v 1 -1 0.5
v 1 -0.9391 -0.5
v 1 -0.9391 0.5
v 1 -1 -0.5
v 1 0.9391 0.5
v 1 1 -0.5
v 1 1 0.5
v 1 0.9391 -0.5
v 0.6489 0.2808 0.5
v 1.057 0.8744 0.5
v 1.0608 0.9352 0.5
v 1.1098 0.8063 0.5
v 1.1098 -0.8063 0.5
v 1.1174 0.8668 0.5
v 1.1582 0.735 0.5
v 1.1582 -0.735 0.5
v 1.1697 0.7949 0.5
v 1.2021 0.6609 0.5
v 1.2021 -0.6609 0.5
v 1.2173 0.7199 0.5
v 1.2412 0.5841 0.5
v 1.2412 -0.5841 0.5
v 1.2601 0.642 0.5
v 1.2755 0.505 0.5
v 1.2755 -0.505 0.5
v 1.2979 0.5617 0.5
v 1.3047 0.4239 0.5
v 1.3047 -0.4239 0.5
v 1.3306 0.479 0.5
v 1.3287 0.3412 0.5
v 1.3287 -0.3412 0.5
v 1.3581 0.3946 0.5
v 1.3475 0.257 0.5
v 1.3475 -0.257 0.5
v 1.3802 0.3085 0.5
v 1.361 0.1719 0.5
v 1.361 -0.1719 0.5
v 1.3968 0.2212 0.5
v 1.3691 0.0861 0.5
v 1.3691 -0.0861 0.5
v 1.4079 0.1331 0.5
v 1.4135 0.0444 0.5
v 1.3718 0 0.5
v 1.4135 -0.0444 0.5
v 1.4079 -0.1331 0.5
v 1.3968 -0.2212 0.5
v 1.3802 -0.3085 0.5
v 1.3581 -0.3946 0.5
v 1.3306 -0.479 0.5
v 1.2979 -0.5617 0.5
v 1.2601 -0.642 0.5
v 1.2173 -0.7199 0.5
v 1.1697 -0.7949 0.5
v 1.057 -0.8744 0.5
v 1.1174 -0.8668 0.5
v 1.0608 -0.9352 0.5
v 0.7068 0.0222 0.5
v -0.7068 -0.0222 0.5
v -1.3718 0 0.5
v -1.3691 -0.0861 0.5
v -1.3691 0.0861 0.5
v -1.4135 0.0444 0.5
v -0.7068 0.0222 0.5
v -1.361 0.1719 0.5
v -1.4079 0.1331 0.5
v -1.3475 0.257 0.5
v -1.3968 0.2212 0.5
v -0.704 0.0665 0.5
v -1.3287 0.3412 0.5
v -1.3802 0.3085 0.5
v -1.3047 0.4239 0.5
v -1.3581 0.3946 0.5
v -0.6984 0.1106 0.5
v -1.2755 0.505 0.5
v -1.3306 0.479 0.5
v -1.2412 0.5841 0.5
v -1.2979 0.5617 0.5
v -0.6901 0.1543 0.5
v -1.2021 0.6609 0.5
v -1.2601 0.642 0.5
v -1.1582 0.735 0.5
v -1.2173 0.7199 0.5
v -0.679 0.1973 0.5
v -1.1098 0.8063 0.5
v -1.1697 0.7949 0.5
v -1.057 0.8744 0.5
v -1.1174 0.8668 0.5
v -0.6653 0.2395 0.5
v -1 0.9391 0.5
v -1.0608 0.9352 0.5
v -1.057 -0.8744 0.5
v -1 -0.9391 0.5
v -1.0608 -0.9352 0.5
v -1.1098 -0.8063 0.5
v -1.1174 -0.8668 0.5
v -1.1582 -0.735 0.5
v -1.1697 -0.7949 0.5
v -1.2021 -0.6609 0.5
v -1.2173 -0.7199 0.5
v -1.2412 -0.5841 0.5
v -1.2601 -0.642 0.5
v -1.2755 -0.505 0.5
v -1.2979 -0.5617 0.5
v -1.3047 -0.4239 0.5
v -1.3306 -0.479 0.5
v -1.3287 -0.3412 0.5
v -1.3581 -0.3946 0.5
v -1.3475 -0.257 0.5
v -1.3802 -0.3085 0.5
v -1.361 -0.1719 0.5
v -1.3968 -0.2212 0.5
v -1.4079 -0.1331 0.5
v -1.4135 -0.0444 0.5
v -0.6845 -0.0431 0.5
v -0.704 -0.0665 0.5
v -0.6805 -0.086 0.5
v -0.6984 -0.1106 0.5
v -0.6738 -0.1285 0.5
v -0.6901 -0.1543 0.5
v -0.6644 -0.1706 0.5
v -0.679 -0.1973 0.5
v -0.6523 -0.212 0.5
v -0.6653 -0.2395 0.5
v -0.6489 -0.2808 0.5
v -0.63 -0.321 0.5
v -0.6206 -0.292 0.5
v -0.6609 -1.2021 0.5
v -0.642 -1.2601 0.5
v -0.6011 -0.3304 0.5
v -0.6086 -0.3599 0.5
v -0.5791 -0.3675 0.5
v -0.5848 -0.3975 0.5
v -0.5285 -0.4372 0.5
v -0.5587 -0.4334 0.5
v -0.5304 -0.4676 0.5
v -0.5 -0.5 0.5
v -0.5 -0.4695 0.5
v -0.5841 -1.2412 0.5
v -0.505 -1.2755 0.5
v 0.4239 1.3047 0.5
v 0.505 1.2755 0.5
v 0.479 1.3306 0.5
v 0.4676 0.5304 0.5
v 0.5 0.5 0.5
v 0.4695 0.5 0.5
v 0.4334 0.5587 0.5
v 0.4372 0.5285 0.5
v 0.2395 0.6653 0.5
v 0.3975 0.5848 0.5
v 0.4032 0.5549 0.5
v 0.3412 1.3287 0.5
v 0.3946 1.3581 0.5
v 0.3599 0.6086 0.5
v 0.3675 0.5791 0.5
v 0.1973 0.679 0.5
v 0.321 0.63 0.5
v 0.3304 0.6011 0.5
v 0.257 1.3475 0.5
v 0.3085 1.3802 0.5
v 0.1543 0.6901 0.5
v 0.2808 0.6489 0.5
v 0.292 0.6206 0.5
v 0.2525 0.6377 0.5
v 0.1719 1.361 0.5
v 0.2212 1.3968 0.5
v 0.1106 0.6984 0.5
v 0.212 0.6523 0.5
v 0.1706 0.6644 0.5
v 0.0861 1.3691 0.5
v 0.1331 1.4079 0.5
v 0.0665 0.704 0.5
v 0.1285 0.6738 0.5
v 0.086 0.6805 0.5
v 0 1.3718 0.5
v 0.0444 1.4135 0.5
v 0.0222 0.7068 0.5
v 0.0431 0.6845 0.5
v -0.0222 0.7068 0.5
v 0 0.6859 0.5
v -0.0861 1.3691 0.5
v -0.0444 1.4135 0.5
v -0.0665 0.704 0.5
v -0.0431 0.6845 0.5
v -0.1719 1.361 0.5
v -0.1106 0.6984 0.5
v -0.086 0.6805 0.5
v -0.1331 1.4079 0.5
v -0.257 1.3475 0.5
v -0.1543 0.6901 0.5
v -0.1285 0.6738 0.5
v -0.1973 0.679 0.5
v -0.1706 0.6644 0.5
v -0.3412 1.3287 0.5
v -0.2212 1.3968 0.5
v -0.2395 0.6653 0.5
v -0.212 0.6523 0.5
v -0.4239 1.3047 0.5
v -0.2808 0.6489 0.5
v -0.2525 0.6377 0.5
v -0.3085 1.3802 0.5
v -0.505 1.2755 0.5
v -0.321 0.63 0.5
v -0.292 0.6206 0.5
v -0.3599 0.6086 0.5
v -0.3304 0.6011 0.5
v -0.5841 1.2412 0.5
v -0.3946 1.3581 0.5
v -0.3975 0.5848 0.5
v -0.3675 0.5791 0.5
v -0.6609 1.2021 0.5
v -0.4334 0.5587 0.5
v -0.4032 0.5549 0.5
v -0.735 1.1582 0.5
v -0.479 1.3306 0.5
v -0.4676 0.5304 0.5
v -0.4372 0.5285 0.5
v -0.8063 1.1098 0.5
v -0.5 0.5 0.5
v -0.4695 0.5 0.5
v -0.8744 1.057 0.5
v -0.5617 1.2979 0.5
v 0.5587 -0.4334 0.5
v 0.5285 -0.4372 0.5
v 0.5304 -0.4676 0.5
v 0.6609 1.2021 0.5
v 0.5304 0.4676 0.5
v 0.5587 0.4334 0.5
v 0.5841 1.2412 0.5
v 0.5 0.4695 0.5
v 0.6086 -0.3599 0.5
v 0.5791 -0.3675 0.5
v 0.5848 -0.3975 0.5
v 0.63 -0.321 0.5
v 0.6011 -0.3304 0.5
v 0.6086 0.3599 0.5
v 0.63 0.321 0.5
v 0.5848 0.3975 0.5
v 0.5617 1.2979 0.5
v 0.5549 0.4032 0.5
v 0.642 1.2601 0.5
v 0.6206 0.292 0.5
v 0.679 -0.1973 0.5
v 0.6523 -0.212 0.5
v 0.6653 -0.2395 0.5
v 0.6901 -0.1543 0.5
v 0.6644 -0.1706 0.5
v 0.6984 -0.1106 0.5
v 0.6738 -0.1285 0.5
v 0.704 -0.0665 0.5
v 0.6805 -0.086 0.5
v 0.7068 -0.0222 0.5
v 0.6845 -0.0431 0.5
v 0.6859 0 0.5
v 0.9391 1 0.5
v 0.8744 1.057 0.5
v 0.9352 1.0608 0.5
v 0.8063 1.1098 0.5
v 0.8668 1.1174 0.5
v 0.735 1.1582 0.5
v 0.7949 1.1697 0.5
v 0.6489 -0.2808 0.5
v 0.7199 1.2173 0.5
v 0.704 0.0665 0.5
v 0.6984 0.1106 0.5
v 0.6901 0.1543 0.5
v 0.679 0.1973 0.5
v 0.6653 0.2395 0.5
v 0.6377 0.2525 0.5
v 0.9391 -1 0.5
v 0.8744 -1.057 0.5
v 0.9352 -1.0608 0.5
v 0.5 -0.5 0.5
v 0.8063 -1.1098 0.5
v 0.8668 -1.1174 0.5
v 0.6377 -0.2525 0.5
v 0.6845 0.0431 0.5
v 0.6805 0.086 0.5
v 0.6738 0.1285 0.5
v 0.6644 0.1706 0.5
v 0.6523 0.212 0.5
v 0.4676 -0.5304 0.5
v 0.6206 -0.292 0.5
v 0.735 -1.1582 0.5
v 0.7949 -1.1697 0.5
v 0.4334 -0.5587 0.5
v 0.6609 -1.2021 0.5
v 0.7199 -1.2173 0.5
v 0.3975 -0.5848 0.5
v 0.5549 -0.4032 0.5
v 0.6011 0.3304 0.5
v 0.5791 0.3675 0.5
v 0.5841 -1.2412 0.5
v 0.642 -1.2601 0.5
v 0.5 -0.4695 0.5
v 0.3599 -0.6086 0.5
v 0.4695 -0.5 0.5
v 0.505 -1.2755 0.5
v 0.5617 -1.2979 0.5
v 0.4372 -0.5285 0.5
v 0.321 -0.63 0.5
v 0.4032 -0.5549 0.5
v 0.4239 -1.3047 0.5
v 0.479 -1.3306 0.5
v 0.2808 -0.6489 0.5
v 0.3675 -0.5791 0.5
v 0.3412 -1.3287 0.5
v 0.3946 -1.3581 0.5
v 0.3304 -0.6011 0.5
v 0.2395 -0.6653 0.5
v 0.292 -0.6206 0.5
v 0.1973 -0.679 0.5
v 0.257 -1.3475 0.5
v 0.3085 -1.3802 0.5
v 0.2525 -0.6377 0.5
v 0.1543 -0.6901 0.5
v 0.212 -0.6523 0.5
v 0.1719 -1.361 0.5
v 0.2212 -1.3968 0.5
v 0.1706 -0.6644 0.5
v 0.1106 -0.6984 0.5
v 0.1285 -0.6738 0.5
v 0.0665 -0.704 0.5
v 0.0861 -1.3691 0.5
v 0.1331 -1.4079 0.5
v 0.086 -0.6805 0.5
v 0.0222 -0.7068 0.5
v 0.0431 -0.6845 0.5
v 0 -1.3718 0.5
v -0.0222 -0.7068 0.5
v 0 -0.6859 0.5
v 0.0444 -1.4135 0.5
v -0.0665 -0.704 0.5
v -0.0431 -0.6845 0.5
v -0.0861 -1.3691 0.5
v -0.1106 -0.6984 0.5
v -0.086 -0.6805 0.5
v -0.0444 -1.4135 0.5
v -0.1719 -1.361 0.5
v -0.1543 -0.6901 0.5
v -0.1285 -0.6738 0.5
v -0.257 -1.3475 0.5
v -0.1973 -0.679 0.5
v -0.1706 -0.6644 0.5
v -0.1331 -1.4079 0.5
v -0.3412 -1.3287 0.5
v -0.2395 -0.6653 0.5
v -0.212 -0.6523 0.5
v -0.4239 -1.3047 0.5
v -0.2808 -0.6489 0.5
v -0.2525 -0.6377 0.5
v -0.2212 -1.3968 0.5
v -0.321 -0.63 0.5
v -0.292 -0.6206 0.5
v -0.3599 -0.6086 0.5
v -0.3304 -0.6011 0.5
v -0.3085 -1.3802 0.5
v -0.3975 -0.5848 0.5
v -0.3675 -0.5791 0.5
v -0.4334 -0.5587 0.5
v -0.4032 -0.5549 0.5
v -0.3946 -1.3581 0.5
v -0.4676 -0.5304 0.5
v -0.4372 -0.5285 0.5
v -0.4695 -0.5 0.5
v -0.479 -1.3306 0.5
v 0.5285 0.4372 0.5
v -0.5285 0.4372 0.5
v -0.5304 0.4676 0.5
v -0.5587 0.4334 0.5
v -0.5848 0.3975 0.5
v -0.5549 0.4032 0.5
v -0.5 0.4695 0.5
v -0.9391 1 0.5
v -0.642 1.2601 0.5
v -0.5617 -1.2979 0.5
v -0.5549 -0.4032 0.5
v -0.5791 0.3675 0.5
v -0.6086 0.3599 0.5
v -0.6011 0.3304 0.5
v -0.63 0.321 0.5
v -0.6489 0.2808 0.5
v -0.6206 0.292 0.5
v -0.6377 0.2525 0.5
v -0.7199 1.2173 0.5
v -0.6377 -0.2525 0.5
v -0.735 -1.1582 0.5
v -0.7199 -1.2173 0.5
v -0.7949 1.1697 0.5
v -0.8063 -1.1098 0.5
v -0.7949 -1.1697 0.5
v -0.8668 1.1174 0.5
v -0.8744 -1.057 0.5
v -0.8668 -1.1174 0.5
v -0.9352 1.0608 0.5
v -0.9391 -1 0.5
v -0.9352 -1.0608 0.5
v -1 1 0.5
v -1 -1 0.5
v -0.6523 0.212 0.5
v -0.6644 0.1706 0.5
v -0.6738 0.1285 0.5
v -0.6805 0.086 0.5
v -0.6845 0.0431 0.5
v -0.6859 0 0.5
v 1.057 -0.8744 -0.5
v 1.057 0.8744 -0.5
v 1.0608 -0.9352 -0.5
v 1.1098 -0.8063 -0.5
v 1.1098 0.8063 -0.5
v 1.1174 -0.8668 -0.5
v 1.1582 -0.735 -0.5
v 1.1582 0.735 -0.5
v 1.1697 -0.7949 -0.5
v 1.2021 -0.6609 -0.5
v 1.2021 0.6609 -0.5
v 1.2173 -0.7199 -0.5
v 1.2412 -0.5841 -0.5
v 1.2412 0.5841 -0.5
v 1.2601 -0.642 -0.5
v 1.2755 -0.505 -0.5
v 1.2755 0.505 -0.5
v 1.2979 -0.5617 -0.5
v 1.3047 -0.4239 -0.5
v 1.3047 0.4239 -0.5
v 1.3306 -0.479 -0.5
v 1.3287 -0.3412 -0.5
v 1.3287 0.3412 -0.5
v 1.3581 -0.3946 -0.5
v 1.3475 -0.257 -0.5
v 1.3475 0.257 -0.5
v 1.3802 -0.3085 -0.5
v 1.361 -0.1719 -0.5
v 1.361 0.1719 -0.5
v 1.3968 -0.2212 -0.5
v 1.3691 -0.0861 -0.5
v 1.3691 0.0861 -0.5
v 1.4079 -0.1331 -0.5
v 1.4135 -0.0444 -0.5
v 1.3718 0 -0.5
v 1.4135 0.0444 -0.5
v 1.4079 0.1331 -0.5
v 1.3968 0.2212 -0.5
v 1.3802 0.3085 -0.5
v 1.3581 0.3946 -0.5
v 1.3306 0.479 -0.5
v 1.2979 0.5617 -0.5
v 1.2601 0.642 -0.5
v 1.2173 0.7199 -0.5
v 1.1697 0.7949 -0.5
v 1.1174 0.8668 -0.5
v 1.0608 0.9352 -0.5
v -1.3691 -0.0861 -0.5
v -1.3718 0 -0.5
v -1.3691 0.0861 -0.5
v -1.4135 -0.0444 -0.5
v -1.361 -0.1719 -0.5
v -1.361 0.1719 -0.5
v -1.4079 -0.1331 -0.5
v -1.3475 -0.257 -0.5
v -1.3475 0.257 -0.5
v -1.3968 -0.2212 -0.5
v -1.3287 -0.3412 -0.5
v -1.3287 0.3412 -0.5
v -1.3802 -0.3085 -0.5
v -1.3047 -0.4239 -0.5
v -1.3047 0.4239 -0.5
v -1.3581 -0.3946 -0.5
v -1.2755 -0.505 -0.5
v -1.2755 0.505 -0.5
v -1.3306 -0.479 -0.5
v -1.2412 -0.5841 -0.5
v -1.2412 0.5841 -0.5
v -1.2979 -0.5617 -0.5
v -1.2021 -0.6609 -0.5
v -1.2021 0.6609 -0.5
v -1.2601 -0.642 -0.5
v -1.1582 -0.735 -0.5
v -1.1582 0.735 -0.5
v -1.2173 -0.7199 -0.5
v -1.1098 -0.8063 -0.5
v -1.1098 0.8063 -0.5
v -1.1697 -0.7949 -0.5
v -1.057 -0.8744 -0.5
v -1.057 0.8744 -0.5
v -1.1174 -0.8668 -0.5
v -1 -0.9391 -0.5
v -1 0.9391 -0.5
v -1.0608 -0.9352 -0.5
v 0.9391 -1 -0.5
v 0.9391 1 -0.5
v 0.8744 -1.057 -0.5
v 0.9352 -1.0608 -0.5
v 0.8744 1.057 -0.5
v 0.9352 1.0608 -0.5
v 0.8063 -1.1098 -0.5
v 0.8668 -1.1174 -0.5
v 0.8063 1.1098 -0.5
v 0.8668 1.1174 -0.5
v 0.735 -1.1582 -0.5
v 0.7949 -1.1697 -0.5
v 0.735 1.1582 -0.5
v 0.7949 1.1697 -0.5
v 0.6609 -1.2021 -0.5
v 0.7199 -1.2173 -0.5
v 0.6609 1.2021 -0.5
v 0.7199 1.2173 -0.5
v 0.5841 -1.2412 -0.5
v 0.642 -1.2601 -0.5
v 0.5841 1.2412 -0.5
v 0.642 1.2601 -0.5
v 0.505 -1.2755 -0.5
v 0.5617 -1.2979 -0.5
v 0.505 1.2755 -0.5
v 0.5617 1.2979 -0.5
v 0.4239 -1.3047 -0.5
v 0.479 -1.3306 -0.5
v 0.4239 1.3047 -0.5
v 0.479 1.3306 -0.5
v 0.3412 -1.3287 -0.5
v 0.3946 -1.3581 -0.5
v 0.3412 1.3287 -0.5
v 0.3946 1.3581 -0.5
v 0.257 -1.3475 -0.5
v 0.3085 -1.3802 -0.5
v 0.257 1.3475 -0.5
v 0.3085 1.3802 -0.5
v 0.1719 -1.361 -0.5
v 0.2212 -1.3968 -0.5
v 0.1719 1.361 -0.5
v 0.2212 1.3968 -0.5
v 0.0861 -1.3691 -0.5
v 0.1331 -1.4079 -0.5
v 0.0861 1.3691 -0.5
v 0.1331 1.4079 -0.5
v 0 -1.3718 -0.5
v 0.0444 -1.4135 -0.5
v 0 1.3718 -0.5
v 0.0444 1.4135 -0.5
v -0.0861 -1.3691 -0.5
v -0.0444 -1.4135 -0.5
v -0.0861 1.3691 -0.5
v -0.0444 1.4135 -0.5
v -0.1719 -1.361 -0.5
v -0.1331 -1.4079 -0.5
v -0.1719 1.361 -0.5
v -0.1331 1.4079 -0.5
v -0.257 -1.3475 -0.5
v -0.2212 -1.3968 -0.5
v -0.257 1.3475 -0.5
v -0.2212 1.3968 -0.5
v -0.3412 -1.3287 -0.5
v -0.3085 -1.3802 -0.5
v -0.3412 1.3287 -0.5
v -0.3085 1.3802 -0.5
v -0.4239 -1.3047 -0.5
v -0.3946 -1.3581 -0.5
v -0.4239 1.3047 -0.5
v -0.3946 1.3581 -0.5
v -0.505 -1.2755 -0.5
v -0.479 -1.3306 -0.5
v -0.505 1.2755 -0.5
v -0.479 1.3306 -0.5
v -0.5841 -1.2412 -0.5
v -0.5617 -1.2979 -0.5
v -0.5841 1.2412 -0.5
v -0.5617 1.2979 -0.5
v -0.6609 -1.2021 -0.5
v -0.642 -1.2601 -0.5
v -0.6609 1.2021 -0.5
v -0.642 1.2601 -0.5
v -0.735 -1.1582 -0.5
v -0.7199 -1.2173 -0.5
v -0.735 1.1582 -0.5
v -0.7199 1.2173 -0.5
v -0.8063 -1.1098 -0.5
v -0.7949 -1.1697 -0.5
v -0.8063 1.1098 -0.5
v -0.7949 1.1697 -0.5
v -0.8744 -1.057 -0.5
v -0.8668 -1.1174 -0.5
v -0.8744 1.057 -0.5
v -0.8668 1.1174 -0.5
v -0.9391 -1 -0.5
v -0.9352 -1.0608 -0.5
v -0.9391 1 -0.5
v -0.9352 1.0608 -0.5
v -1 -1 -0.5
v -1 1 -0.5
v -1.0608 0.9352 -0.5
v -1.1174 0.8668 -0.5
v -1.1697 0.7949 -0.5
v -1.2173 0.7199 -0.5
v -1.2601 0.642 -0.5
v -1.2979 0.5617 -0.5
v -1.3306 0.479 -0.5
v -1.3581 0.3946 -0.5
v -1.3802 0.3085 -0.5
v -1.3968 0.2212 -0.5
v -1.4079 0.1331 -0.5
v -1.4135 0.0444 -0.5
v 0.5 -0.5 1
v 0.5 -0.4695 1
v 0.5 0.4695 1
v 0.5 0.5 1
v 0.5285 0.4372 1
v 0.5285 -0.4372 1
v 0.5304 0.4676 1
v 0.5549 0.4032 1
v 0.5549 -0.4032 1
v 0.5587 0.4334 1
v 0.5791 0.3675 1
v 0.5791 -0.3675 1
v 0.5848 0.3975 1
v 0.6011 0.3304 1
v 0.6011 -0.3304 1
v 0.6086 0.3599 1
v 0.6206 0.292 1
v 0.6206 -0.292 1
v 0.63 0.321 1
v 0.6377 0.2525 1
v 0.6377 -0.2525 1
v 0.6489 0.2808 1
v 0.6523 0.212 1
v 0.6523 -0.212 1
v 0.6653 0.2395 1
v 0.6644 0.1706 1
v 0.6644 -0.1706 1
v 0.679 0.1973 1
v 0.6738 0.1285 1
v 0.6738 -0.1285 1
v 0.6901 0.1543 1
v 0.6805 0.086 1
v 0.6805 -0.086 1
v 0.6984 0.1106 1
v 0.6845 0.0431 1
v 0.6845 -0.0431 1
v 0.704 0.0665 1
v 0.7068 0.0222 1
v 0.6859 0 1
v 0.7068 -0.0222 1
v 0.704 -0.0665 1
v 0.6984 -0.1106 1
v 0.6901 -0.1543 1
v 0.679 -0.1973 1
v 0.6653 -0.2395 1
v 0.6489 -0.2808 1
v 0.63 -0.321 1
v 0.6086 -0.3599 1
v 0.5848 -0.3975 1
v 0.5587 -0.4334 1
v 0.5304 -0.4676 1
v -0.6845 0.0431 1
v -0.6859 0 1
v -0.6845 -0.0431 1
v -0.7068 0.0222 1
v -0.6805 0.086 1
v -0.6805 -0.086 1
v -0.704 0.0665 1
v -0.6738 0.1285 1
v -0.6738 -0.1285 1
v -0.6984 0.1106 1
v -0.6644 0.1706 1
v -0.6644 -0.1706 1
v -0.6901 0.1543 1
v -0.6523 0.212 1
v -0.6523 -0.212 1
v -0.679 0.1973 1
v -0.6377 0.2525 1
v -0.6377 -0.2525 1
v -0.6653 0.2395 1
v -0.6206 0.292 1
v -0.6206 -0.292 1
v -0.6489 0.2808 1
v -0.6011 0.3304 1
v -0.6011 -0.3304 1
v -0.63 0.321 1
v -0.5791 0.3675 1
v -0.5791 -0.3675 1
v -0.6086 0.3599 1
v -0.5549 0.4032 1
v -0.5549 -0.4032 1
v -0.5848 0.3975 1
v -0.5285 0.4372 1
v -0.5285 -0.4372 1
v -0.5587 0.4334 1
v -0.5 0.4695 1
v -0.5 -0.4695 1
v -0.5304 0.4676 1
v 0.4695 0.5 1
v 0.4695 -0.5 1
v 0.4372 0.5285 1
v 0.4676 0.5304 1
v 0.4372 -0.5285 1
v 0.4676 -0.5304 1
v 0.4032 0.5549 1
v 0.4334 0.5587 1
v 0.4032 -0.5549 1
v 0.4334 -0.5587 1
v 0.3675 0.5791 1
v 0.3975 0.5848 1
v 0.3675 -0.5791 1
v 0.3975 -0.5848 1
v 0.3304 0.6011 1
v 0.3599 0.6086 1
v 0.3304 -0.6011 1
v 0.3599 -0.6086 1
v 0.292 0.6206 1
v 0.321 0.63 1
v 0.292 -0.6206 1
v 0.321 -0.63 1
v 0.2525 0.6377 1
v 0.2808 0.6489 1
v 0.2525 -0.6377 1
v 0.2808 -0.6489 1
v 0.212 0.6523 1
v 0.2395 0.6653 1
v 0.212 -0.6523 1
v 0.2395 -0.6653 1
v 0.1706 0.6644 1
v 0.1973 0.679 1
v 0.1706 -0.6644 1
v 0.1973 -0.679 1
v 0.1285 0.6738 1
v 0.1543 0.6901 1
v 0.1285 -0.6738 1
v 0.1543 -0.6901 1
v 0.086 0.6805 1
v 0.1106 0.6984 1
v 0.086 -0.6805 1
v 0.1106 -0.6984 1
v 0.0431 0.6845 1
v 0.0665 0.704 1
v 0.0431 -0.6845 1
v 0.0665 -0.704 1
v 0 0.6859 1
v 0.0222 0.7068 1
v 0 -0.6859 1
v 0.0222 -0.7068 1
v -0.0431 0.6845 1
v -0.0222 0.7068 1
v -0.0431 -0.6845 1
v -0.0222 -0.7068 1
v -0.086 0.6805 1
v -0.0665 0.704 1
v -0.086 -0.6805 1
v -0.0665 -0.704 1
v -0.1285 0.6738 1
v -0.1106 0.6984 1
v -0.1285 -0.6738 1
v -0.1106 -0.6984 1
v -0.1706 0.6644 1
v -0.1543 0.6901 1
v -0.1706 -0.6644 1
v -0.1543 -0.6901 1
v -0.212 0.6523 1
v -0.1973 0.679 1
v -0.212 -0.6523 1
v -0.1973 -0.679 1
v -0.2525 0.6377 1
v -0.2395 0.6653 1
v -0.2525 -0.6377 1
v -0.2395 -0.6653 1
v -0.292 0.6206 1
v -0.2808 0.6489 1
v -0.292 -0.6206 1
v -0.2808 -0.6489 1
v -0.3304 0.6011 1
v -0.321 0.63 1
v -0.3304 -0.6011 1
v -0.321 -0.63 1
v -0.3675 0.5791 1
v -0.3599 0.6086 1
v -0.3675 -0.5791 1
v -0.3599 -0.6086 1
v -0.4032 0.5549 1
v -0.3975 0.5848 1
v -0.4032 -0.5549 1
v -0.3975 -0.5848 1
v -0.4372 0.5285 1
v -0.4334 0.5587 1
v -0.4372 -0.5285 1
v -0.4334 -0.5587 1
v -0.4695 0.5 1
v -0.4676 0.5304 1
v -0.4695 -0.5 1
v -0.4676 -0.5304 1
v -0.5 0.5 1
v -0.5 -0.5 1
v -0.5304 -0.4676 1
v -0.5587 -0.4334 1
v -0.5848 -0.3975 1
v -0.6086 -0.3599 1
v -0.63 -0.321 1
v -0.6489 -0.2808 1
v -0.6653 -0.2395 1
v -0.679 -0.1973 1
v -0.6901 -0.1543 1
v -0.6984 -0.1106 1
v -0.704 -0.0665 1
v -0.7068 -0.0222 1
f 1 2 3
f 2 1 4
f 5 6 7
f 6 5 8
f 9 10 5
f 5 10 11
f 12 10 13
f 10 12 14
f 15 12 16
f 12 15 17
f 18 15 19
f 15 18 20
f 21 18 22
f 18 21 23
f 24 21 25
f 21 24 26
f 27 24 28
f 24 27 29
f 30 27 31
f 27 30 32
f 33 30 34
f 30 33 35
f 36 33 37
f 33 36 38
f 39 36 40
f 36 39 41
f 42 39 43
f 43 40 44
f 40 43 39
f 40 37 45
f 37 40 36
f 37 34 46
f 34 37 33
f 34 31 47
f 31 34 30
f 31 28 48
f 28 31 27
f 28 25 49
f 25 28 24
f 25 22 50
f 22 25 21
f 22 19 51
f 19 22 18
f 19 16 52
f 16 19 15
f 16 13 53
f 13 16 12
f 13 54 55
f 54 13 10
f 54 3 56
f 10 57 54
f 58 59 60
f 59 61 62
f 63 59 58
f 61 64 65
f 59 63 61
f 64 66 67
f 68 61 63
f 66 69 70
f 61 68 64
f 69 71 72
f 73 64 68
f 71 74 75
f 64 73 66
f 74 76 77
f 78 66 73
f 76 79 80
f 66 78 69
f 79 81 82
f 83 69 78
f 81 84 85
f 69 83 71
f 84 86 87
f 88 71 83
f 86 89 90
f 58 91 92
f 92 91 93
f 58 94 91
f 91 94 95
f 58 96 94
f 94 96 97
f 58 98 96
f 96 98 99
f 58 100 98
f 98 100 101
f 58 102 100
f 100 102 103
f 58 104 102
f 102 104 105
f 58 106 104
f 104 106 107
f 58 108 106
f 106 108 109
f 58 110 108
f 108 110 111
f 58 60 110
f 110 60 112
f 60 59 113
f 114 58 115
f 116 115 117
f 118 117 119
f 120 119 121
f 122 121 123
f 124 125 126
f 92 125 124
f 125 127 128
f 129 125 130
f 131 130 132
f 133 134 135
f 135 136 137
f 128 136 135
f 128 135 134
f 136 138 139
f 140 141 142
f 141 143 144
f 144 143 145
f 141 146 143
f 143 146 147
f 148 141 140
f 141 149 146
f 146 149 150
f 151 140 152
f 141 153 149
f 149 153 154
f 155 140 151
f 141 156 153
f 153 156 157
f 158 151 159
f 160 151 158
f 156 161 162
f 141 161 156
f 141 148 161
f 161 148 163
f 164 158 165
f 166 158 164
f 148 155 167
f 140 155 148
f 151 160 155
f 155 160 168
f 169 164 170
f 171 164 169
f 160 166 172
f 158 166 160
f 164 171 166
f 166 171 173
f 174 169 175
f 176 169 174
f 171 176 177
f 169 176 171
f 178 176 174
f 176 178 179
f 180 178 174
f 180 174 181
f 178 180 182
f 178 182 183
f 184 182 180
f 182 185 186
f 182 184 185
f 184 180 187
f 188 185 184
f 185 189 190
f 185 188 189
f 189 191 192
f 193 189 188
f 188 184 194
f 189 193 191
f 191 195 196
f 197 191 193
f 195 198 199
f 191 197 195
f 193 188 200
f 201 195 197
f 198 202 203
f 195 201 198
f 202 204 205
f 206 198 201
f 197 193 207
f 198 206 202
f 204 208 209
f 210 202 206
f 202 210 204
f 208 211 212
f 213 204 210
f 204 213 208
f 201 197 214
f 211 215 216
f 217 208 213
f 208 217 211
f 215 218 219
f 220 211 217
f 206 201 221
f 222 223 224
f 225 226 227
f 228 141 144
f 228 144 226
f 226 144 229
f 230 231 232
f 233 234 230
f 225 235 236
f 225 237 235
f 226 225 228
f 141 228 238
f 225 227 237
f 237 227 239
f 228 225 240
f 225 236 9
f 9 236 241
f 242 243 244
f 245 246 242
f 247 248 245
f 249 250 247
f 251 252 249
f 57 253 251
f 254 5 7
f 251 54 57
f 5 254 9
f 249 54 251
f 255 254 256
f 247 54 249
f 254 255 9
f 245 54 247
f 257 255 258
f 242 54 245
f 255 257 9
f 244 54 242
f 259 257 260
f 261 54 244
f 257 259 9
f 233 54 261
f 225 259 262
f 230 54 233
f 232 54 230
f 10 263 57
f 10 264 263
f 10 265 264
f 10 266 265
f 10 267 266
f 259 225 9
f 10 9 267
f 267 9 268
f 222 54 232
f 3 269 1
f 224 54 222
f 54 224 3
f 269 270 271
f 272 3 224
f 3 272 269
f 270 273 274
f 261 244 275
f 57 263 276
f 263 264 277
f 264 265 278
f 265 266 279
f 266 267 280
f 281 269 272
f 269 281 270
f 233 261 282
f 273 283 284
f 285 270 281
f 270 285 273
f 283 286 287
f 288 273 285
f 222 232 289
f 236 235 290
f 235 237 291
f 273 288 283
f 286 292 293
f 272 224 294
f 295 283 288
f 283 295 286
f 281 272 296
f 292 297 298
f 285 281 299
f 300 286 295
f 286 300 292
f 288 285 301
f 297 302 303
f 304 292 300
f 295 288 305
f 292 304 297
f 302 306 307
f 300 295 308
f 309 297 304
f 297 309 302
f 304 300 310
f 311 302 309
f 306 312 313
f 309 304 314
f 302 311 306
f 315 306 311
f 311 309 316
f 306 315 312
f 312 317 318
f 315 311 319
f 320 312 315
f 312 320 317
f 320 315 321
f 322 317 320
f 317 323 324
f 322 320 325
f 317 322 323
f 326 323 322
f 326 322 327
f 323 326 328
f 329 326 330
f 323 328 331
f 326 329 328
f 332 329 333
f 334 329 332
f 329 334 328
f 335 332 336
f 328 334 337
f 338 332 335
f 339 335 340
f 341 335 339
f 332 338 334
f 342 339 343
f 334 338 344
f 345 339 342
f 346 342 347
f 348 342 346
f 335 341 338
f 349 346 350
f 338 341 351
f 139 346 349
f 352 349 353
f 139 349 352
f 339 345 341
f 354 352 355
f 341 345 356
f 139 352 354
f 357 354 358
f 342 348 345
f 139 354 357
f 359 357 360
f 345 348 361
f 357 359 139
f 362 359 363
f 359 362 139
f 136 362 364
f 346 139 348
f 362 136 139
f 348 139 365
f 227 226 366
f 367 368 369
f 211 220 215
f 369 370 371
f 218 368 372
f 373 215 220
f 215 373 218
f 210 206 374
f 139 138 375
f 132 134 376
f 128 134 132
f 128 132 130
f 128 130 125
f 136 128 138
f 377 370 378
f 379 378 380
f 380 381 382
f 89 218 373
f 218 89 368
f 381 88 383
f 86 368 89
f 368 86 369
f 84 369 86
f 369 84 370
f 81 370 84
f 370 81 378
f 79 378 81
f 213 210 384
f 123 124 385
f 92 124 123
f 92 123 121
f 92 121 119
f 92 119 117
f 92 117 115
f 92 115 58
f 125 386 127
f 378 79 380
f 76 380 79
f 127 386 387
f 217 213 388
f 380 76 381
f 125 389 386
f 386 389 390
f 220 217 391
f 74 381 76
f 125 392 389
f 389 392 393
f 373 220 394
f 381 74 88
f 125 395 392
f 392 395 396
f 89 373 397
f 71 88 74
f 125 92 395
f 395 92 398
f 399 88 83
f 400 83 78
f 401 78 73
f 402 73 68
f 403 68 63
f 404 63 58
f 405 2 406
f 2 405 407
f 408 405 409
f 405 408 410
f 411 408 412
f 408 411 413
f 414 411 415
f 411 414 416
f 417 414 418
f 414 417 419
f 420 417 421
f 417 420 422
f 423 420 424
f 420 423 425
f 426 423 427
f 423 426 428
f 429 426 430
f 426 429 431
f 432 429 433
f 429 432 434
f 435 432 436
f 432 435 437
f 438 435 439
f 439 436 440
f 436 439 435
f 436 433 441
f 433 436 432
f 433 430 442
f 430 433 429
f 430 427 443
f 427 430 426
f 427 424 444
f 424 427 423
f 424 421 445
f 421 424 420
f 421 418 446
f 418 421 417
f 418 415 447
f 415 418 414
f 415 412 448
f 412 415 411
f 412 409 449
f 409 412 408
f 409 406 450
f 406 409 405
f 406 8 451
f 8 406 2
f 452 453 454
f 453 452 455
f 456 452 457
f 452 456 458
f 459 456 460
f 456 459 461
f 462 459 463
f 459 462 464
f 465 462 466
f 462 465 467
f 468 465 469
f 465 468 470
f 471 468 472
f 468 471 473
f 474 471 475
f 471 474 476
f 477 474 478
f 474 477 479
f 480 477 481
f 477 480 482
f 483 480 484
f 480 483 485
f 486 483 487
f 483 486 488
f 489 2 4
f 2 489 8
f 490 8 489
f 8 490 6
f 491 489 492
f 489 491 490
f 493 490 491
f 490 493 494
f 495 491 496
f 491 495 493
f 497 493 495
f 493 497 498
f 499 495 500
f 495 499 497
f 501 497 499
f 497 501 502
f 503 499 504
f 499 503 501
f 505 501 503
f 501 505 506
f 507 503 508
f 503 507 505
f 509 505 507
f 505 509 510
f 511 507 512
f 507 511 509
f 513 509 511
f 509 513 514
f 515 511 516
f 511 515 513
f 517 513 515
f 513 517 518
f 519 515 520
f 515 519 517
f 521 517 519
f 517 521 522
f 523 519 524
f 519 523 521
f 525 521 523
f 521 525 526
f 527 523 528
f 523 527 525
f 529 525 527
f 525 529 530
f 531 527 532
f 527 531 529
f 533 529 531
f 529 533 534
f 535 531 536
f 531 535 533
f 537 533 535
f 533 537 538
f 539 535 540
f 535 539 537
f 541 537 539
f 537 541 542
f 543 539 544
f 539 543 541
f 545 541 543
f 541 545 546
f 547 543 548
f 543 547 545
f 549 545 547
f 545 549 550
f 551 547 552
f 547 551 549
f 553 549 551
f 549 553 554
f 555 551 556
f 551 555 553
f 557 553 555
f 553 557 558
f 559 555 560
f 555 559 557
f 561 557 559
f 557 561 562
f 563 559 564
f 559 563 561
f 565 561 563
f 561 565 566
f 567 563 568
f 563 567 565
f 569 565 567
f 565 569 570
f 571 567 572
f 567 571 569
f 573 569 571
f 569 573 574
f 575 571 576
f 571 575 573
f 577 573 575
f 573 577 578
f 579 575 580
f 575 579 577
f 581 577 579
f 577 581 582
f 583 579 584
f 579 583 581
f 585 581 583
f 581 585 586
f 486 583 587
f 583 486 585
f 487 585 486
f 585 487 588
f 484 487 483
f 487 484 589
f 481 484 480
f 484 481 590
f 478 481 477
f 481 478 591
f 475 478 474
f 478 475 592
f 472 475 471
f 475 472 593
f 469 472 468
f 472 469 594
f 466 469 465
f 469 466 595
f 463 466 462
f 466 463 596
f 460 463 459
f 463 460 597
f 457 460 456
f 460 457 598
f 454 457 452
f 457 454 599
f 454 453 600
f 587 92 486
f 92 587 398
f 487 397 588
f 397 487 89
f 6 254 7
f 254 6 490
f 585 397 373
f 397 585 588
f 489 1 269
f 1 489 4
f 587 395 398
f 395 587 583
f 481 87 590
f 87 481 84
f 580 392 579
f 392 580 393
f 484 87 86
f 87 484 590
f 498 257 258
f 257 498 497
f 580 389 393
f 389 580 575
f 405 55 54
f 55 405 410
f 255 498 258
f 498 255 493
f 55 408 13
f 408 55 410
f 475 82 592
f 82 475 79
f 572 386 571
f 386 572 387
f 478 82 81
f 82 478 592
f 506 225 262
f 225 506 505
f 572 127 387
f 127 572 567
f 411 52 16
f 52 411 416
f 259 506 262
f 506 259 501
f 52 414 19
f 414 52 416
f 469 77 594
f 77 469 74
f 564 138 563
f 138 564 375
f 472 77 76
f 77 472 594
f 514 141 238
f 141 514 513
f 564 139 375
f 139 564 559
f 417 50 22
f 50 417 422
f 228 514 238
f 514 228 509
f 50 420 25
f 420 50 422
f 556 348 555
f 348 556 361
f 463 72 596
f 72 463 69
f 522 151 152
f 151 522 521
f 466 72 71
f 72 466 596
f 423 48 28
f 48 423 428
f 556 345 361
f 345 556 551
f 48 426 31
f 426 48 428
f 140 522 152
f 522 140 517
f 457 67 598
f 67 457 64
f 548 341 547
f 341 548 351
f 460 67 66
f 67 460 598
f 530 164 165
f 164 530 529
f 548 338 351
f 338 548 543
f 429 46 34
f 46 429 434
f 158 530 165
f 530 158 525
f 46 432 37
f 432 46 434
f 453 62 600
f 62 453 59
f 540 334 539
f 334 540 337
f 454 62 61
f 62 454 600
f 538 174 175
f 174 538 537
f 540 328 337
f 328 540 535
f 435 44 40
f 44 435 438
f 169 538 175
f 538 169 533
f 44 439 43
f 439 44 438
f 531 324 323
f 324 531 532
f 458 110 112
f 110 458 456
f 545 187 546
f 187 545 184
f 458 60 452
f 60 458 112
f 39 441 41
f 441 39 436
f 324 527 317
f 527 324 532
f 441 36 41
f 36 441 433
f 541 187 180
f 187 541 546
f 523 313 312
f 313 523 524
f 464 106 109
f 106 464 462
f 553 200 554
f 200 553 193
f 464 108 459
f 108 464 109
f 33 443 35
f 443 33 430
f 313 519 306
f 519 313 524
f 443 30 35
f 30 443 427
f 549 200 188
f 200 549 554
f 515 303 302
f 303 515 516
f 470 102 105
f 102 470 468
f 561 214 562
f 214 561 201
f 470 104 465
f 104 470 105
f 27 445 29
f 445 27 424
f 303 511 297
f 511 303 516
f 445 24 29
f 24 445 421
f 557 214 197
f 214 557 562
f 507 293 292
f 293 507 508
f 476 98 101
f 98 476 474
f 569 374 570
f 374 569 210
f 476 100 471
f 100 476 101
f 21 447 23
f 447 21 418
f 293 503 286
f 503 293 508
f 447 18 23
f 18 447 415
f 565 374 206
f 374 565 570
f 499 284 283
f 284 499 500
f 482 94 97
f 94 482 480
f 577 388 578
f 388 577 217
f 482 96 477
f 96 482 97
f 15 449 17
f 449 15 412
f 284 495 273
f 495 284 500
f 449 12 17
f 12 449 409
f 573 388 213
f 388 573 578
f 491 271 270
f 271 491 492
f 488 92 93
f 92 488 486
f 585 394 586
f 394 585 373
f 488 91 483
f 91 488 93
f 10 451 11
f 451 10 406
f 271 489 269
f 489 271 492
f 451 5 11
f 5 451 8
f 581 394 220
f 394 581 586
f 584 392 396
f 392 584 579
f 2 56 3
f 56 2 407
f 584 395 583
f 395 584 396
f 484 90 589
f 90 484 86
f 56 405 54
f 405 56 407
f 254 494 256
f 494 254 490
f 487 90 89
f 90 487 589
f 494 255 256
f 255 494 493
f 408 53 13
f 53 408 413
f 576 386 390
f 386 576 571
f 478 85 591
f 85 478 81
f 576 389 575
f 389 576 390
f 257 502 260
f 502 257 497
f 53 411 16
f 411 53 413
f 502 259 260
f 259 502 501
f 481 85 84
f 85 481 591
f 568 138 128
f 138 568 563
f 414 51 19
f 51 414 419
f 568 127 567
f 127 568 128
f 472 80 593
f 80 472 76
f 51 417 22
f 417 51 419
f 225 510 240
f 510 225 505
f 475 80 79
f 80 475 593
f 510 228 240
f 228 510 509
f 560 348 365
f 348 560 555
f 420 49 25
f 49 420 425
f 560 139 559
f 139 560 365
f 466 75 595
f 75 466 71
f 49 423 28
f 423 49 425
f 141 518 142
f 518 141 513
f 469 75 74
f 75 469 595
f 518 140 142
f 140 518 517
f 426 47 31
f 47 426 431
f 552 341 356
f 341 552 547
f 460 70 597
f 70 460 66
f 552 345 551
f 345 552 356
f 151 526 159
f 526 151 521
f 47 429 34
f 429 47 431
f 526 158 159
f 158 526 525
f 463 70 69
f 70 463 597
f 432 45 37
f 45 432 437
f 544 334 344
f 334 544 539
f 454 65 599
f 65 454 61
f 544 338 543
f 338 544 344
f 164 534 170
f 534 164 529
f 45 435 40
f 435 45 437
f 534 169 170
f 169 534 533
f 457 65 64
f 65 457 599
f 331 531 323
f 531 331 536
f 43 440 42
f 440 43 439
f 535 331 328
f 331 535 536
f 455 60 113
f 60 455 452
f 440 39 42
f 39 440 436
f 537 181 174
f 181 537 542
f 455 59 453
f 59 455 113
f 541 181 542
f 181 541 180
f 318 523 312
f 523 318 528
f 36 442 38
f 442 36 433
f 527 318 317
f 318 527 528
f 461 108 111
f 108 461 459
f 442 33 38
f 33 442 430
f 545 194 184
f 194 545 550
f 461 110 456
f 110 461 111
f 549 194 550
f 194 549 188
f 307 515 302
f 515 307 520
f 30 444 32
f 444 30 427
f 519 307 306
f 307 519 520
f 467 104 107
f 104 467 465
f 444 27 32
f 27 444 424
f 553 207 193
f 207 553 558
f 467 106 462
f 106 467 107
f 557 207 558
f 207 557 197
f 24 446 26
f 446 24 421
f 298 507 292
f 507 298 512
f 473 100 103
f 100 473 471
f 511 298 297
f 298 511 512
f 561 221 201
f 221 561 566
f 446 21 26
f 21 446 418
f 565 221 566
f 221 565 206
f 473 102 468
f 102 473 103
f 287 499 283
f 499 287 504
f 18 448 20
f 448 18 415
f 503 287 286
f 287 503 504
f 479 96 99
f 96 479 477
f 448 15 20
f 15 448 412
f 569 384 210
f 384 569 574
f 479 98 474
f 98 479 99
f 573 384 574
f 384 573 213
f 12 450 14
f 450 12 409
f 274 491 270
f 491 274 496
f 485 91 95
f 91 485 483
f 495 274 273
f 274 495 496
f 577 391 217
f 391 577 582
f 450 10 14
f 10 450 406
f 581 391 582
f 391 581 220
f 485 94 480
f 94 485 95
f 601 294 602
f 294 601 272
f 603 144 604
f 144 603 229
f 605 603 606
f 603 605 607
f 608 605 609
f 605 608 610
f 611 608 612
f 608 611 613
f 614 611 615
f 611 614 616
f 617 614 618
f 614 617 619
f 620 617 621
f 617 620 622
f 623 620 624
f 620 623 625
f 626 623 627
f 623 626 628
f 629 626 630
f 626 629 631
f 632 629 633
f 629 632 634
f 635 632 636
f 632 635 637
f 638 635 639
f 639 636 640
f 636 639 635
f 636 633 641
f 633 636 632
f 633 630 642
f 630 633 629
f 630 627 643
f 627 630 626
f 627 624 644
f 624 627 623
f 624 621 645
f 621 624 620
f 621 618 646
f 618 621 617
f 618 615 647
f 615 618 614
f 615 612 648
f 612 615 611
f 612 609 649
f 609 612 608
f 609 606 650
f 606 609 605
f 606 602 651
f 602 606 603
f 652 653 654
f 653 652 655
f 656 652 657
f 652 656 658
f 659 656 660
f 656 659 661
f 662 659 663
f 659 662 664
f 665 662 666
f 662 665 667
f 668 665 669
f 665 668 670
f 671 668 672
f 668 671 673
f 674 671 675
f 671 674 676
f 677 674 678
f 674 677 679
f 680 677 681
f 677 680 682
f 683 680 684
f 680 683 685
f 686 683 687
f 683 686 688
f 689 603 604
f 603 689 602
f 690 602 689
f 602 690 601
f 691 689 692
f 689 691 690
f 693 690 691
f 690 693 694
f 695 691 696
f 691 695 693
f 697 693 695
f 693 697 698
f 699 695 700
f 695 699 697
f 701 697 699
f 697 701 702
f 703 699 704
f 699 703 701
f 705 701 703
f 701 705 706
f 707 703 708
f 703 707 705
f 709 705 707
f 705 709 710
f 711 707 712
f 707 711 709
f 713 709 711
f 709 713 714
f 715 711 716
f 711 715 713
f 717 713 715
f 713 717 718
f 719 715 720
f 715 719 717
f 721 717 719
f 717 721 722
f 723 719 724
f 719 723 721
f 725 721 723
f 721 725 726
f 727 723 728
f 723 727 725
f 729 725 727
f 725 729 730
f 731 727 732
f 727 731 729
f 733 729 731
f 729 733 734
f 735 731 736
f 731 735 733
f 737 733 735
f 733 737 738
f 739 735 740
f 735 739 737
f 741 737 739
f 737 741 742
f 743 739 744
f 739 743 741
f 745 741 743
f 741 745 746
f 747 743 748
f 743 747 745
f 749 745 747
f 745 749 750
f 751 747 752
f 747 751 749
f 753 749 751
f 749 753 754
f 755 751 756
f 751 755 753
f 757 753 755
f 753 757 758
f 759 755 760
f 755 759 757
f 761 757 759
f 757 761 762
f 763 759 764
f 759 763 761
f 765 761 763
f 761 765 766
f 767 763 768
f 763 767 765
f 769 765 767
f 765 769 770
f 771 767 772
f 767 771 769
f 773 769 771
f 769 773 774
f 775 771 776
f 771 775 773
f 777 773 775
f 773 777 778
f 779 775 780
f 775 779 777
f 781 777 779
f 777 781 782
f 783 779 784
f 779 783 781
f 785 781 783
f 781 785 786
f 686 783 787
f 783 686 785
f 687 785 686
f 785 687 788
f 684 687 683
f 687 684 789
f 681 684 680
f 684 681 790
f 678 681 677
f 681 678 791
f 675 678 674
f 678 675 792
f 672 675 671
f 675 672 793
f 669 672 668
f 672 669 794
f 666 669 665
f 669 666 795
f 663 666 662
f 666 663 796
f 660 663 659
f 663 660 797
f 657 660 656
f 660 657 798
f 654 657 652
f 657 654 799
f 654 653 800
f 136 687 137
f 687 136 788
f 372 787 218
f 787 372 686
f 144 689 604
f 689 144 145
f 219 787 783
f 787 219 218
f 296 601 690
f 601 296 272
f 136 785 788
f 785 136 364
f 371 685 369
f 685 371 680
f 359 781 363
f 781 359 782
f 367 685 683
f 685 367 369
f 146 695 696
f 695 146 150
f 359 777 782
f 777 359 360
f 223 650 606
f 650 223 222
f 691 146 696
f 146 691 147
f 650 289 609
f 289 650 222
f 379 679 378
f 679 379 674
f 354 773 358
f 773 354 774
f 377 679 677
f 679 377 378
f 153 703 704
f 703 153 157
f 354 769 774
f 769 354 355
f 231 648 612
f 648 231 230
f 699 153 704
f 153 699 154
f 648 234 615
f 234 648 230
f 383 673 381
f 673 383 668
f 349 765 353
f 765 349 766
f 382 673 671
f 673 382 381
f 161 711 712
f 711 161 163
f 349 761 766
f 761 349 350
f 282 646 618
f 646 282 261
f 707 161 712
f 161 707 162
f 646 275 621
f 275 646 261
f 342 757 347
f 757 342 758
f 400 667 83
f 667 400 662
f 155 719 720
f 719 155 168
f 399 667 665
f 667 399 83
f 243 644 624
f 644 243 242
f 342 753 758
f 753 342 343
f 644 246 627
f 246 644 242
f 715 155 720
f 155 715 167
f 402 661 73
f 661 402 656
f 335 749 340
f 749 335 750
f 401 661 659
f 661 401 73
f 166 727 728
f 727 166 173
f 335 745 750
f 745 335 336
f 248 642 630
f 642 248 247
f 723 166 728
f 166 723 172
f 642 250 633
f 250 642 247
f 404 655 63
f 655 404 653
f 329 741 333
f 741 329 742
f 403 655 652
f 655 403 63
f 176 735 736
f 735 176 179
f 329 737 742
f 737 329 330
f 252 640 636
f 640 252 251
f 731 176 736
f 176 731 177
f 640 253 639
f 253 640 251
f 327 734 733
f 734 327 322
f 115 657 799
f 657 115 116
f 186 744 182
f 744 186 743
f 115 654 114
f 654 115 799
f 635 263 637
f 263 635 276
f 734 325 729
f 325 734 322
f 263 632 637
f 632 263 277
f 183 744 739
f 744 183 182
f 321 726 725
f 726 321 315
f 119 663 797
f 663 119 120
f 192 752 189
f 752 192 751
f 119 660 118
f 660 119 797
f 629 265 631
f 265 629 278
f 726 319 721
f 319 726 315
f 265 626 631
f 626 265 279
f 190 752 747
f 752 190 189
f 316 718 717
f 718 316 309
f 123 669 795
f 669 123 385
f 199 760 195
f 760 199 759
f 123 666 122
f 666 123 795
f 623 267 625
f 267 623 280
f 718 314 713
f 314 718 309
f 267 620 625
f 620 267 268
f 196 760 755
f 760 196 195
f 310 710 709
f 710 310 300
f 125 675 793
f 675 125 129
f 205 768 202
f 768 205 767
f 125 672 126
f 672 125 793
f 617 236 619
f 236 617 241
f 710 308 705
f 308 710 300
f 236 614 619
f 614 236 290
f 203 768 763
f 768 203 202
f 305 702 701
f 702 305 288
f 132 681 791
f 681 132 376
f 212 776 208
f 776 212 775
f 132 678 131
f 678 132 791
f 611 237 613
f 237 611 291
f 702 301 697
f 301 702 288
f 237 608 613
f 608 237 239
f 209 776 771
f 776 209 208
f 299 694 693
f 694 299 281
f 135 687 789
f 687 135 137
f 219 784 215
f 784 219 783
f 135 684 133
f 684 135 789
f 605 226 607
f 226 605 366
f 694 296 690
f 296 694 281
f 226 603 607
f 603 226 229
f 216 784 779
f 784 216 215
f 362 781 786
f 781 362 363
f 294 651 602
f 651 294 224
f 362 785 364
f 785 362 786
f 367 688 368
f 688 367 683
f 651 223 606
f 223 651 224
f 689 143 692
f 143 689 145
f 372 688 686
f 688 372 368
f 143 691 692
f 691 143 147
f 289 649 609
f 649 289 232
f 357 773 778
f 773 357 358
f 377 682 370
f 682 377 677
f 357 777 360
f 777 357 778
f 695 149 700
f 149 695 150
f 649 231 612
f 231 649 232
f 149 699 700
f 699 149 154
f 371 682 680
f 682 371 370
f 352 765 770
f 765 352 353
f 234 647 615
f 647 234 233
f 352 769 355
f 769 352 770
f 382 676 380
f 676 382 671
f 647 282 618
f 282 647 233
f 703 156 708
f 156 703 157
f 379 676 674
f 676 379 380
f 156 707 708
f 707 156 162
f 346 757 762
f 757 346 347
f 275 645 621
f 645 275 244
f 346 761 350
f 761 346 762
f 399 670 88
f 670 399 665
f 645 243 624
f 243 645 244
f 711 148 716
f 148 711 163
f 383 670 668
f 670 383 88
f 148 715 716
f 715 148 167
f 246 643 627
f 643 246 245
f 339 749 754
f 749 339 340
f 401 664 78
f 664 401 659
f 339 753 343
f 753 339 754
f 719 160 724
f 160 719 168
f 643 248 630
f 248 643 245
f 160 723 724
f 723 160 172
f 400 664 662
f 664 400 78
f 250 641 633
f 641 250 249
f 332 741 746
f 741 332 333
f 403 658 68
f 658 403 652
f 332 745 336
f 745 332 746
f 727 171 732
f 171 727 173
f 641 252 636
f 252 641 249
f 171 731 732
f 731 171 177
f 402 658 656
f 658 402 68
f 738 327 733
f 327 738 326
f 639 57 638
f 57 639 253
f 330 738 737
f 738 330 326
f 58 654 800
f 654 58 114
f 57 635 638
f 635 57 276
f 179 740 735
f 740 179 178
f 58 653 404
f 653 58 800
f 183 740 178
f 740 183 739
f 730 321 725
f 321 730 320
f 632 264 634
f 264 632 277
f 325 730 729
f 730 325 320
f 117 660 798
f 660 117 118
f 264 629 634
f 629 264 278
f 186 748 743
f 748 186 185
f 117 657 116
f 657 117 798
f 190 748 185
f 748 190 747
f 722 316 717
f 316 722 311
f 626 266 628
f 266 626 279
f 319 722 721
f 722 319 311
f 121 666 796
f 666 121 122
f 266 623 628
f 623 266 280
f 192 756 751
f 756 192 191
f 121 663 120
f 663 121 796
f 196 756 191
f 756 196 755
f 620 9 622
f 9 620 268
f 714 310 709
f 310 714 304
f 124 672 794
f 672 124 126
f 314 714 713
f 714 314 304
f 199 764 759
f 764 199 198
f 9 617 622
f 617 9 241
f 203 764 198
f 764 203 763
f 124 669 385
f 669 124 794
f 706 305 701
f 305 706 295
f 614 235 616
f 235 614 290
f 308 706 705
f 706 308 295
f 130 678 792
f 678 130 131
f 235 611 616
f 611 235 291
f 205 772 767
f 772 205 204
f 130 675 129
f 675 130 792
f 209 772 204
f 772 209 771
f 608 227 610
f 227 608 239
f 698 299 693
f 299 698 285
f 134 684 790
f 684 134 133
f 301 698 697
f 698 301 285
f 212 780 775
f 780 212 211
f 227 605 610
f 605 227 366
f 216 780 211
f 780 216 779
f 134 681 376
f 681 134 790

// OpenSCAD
module multi_rot_cube(N=10) {
   alpha=360/N;
   union() {
      for(i=[0:N-1]) {
         rotate(i*alpha)
            cube(center=true);
      }
   }
}


union() {
   scale([2,2,1]) multi_rot_cube(N=50);
   translate([0,0,0.5]) multi_rot_cube(N=50);
}
   
